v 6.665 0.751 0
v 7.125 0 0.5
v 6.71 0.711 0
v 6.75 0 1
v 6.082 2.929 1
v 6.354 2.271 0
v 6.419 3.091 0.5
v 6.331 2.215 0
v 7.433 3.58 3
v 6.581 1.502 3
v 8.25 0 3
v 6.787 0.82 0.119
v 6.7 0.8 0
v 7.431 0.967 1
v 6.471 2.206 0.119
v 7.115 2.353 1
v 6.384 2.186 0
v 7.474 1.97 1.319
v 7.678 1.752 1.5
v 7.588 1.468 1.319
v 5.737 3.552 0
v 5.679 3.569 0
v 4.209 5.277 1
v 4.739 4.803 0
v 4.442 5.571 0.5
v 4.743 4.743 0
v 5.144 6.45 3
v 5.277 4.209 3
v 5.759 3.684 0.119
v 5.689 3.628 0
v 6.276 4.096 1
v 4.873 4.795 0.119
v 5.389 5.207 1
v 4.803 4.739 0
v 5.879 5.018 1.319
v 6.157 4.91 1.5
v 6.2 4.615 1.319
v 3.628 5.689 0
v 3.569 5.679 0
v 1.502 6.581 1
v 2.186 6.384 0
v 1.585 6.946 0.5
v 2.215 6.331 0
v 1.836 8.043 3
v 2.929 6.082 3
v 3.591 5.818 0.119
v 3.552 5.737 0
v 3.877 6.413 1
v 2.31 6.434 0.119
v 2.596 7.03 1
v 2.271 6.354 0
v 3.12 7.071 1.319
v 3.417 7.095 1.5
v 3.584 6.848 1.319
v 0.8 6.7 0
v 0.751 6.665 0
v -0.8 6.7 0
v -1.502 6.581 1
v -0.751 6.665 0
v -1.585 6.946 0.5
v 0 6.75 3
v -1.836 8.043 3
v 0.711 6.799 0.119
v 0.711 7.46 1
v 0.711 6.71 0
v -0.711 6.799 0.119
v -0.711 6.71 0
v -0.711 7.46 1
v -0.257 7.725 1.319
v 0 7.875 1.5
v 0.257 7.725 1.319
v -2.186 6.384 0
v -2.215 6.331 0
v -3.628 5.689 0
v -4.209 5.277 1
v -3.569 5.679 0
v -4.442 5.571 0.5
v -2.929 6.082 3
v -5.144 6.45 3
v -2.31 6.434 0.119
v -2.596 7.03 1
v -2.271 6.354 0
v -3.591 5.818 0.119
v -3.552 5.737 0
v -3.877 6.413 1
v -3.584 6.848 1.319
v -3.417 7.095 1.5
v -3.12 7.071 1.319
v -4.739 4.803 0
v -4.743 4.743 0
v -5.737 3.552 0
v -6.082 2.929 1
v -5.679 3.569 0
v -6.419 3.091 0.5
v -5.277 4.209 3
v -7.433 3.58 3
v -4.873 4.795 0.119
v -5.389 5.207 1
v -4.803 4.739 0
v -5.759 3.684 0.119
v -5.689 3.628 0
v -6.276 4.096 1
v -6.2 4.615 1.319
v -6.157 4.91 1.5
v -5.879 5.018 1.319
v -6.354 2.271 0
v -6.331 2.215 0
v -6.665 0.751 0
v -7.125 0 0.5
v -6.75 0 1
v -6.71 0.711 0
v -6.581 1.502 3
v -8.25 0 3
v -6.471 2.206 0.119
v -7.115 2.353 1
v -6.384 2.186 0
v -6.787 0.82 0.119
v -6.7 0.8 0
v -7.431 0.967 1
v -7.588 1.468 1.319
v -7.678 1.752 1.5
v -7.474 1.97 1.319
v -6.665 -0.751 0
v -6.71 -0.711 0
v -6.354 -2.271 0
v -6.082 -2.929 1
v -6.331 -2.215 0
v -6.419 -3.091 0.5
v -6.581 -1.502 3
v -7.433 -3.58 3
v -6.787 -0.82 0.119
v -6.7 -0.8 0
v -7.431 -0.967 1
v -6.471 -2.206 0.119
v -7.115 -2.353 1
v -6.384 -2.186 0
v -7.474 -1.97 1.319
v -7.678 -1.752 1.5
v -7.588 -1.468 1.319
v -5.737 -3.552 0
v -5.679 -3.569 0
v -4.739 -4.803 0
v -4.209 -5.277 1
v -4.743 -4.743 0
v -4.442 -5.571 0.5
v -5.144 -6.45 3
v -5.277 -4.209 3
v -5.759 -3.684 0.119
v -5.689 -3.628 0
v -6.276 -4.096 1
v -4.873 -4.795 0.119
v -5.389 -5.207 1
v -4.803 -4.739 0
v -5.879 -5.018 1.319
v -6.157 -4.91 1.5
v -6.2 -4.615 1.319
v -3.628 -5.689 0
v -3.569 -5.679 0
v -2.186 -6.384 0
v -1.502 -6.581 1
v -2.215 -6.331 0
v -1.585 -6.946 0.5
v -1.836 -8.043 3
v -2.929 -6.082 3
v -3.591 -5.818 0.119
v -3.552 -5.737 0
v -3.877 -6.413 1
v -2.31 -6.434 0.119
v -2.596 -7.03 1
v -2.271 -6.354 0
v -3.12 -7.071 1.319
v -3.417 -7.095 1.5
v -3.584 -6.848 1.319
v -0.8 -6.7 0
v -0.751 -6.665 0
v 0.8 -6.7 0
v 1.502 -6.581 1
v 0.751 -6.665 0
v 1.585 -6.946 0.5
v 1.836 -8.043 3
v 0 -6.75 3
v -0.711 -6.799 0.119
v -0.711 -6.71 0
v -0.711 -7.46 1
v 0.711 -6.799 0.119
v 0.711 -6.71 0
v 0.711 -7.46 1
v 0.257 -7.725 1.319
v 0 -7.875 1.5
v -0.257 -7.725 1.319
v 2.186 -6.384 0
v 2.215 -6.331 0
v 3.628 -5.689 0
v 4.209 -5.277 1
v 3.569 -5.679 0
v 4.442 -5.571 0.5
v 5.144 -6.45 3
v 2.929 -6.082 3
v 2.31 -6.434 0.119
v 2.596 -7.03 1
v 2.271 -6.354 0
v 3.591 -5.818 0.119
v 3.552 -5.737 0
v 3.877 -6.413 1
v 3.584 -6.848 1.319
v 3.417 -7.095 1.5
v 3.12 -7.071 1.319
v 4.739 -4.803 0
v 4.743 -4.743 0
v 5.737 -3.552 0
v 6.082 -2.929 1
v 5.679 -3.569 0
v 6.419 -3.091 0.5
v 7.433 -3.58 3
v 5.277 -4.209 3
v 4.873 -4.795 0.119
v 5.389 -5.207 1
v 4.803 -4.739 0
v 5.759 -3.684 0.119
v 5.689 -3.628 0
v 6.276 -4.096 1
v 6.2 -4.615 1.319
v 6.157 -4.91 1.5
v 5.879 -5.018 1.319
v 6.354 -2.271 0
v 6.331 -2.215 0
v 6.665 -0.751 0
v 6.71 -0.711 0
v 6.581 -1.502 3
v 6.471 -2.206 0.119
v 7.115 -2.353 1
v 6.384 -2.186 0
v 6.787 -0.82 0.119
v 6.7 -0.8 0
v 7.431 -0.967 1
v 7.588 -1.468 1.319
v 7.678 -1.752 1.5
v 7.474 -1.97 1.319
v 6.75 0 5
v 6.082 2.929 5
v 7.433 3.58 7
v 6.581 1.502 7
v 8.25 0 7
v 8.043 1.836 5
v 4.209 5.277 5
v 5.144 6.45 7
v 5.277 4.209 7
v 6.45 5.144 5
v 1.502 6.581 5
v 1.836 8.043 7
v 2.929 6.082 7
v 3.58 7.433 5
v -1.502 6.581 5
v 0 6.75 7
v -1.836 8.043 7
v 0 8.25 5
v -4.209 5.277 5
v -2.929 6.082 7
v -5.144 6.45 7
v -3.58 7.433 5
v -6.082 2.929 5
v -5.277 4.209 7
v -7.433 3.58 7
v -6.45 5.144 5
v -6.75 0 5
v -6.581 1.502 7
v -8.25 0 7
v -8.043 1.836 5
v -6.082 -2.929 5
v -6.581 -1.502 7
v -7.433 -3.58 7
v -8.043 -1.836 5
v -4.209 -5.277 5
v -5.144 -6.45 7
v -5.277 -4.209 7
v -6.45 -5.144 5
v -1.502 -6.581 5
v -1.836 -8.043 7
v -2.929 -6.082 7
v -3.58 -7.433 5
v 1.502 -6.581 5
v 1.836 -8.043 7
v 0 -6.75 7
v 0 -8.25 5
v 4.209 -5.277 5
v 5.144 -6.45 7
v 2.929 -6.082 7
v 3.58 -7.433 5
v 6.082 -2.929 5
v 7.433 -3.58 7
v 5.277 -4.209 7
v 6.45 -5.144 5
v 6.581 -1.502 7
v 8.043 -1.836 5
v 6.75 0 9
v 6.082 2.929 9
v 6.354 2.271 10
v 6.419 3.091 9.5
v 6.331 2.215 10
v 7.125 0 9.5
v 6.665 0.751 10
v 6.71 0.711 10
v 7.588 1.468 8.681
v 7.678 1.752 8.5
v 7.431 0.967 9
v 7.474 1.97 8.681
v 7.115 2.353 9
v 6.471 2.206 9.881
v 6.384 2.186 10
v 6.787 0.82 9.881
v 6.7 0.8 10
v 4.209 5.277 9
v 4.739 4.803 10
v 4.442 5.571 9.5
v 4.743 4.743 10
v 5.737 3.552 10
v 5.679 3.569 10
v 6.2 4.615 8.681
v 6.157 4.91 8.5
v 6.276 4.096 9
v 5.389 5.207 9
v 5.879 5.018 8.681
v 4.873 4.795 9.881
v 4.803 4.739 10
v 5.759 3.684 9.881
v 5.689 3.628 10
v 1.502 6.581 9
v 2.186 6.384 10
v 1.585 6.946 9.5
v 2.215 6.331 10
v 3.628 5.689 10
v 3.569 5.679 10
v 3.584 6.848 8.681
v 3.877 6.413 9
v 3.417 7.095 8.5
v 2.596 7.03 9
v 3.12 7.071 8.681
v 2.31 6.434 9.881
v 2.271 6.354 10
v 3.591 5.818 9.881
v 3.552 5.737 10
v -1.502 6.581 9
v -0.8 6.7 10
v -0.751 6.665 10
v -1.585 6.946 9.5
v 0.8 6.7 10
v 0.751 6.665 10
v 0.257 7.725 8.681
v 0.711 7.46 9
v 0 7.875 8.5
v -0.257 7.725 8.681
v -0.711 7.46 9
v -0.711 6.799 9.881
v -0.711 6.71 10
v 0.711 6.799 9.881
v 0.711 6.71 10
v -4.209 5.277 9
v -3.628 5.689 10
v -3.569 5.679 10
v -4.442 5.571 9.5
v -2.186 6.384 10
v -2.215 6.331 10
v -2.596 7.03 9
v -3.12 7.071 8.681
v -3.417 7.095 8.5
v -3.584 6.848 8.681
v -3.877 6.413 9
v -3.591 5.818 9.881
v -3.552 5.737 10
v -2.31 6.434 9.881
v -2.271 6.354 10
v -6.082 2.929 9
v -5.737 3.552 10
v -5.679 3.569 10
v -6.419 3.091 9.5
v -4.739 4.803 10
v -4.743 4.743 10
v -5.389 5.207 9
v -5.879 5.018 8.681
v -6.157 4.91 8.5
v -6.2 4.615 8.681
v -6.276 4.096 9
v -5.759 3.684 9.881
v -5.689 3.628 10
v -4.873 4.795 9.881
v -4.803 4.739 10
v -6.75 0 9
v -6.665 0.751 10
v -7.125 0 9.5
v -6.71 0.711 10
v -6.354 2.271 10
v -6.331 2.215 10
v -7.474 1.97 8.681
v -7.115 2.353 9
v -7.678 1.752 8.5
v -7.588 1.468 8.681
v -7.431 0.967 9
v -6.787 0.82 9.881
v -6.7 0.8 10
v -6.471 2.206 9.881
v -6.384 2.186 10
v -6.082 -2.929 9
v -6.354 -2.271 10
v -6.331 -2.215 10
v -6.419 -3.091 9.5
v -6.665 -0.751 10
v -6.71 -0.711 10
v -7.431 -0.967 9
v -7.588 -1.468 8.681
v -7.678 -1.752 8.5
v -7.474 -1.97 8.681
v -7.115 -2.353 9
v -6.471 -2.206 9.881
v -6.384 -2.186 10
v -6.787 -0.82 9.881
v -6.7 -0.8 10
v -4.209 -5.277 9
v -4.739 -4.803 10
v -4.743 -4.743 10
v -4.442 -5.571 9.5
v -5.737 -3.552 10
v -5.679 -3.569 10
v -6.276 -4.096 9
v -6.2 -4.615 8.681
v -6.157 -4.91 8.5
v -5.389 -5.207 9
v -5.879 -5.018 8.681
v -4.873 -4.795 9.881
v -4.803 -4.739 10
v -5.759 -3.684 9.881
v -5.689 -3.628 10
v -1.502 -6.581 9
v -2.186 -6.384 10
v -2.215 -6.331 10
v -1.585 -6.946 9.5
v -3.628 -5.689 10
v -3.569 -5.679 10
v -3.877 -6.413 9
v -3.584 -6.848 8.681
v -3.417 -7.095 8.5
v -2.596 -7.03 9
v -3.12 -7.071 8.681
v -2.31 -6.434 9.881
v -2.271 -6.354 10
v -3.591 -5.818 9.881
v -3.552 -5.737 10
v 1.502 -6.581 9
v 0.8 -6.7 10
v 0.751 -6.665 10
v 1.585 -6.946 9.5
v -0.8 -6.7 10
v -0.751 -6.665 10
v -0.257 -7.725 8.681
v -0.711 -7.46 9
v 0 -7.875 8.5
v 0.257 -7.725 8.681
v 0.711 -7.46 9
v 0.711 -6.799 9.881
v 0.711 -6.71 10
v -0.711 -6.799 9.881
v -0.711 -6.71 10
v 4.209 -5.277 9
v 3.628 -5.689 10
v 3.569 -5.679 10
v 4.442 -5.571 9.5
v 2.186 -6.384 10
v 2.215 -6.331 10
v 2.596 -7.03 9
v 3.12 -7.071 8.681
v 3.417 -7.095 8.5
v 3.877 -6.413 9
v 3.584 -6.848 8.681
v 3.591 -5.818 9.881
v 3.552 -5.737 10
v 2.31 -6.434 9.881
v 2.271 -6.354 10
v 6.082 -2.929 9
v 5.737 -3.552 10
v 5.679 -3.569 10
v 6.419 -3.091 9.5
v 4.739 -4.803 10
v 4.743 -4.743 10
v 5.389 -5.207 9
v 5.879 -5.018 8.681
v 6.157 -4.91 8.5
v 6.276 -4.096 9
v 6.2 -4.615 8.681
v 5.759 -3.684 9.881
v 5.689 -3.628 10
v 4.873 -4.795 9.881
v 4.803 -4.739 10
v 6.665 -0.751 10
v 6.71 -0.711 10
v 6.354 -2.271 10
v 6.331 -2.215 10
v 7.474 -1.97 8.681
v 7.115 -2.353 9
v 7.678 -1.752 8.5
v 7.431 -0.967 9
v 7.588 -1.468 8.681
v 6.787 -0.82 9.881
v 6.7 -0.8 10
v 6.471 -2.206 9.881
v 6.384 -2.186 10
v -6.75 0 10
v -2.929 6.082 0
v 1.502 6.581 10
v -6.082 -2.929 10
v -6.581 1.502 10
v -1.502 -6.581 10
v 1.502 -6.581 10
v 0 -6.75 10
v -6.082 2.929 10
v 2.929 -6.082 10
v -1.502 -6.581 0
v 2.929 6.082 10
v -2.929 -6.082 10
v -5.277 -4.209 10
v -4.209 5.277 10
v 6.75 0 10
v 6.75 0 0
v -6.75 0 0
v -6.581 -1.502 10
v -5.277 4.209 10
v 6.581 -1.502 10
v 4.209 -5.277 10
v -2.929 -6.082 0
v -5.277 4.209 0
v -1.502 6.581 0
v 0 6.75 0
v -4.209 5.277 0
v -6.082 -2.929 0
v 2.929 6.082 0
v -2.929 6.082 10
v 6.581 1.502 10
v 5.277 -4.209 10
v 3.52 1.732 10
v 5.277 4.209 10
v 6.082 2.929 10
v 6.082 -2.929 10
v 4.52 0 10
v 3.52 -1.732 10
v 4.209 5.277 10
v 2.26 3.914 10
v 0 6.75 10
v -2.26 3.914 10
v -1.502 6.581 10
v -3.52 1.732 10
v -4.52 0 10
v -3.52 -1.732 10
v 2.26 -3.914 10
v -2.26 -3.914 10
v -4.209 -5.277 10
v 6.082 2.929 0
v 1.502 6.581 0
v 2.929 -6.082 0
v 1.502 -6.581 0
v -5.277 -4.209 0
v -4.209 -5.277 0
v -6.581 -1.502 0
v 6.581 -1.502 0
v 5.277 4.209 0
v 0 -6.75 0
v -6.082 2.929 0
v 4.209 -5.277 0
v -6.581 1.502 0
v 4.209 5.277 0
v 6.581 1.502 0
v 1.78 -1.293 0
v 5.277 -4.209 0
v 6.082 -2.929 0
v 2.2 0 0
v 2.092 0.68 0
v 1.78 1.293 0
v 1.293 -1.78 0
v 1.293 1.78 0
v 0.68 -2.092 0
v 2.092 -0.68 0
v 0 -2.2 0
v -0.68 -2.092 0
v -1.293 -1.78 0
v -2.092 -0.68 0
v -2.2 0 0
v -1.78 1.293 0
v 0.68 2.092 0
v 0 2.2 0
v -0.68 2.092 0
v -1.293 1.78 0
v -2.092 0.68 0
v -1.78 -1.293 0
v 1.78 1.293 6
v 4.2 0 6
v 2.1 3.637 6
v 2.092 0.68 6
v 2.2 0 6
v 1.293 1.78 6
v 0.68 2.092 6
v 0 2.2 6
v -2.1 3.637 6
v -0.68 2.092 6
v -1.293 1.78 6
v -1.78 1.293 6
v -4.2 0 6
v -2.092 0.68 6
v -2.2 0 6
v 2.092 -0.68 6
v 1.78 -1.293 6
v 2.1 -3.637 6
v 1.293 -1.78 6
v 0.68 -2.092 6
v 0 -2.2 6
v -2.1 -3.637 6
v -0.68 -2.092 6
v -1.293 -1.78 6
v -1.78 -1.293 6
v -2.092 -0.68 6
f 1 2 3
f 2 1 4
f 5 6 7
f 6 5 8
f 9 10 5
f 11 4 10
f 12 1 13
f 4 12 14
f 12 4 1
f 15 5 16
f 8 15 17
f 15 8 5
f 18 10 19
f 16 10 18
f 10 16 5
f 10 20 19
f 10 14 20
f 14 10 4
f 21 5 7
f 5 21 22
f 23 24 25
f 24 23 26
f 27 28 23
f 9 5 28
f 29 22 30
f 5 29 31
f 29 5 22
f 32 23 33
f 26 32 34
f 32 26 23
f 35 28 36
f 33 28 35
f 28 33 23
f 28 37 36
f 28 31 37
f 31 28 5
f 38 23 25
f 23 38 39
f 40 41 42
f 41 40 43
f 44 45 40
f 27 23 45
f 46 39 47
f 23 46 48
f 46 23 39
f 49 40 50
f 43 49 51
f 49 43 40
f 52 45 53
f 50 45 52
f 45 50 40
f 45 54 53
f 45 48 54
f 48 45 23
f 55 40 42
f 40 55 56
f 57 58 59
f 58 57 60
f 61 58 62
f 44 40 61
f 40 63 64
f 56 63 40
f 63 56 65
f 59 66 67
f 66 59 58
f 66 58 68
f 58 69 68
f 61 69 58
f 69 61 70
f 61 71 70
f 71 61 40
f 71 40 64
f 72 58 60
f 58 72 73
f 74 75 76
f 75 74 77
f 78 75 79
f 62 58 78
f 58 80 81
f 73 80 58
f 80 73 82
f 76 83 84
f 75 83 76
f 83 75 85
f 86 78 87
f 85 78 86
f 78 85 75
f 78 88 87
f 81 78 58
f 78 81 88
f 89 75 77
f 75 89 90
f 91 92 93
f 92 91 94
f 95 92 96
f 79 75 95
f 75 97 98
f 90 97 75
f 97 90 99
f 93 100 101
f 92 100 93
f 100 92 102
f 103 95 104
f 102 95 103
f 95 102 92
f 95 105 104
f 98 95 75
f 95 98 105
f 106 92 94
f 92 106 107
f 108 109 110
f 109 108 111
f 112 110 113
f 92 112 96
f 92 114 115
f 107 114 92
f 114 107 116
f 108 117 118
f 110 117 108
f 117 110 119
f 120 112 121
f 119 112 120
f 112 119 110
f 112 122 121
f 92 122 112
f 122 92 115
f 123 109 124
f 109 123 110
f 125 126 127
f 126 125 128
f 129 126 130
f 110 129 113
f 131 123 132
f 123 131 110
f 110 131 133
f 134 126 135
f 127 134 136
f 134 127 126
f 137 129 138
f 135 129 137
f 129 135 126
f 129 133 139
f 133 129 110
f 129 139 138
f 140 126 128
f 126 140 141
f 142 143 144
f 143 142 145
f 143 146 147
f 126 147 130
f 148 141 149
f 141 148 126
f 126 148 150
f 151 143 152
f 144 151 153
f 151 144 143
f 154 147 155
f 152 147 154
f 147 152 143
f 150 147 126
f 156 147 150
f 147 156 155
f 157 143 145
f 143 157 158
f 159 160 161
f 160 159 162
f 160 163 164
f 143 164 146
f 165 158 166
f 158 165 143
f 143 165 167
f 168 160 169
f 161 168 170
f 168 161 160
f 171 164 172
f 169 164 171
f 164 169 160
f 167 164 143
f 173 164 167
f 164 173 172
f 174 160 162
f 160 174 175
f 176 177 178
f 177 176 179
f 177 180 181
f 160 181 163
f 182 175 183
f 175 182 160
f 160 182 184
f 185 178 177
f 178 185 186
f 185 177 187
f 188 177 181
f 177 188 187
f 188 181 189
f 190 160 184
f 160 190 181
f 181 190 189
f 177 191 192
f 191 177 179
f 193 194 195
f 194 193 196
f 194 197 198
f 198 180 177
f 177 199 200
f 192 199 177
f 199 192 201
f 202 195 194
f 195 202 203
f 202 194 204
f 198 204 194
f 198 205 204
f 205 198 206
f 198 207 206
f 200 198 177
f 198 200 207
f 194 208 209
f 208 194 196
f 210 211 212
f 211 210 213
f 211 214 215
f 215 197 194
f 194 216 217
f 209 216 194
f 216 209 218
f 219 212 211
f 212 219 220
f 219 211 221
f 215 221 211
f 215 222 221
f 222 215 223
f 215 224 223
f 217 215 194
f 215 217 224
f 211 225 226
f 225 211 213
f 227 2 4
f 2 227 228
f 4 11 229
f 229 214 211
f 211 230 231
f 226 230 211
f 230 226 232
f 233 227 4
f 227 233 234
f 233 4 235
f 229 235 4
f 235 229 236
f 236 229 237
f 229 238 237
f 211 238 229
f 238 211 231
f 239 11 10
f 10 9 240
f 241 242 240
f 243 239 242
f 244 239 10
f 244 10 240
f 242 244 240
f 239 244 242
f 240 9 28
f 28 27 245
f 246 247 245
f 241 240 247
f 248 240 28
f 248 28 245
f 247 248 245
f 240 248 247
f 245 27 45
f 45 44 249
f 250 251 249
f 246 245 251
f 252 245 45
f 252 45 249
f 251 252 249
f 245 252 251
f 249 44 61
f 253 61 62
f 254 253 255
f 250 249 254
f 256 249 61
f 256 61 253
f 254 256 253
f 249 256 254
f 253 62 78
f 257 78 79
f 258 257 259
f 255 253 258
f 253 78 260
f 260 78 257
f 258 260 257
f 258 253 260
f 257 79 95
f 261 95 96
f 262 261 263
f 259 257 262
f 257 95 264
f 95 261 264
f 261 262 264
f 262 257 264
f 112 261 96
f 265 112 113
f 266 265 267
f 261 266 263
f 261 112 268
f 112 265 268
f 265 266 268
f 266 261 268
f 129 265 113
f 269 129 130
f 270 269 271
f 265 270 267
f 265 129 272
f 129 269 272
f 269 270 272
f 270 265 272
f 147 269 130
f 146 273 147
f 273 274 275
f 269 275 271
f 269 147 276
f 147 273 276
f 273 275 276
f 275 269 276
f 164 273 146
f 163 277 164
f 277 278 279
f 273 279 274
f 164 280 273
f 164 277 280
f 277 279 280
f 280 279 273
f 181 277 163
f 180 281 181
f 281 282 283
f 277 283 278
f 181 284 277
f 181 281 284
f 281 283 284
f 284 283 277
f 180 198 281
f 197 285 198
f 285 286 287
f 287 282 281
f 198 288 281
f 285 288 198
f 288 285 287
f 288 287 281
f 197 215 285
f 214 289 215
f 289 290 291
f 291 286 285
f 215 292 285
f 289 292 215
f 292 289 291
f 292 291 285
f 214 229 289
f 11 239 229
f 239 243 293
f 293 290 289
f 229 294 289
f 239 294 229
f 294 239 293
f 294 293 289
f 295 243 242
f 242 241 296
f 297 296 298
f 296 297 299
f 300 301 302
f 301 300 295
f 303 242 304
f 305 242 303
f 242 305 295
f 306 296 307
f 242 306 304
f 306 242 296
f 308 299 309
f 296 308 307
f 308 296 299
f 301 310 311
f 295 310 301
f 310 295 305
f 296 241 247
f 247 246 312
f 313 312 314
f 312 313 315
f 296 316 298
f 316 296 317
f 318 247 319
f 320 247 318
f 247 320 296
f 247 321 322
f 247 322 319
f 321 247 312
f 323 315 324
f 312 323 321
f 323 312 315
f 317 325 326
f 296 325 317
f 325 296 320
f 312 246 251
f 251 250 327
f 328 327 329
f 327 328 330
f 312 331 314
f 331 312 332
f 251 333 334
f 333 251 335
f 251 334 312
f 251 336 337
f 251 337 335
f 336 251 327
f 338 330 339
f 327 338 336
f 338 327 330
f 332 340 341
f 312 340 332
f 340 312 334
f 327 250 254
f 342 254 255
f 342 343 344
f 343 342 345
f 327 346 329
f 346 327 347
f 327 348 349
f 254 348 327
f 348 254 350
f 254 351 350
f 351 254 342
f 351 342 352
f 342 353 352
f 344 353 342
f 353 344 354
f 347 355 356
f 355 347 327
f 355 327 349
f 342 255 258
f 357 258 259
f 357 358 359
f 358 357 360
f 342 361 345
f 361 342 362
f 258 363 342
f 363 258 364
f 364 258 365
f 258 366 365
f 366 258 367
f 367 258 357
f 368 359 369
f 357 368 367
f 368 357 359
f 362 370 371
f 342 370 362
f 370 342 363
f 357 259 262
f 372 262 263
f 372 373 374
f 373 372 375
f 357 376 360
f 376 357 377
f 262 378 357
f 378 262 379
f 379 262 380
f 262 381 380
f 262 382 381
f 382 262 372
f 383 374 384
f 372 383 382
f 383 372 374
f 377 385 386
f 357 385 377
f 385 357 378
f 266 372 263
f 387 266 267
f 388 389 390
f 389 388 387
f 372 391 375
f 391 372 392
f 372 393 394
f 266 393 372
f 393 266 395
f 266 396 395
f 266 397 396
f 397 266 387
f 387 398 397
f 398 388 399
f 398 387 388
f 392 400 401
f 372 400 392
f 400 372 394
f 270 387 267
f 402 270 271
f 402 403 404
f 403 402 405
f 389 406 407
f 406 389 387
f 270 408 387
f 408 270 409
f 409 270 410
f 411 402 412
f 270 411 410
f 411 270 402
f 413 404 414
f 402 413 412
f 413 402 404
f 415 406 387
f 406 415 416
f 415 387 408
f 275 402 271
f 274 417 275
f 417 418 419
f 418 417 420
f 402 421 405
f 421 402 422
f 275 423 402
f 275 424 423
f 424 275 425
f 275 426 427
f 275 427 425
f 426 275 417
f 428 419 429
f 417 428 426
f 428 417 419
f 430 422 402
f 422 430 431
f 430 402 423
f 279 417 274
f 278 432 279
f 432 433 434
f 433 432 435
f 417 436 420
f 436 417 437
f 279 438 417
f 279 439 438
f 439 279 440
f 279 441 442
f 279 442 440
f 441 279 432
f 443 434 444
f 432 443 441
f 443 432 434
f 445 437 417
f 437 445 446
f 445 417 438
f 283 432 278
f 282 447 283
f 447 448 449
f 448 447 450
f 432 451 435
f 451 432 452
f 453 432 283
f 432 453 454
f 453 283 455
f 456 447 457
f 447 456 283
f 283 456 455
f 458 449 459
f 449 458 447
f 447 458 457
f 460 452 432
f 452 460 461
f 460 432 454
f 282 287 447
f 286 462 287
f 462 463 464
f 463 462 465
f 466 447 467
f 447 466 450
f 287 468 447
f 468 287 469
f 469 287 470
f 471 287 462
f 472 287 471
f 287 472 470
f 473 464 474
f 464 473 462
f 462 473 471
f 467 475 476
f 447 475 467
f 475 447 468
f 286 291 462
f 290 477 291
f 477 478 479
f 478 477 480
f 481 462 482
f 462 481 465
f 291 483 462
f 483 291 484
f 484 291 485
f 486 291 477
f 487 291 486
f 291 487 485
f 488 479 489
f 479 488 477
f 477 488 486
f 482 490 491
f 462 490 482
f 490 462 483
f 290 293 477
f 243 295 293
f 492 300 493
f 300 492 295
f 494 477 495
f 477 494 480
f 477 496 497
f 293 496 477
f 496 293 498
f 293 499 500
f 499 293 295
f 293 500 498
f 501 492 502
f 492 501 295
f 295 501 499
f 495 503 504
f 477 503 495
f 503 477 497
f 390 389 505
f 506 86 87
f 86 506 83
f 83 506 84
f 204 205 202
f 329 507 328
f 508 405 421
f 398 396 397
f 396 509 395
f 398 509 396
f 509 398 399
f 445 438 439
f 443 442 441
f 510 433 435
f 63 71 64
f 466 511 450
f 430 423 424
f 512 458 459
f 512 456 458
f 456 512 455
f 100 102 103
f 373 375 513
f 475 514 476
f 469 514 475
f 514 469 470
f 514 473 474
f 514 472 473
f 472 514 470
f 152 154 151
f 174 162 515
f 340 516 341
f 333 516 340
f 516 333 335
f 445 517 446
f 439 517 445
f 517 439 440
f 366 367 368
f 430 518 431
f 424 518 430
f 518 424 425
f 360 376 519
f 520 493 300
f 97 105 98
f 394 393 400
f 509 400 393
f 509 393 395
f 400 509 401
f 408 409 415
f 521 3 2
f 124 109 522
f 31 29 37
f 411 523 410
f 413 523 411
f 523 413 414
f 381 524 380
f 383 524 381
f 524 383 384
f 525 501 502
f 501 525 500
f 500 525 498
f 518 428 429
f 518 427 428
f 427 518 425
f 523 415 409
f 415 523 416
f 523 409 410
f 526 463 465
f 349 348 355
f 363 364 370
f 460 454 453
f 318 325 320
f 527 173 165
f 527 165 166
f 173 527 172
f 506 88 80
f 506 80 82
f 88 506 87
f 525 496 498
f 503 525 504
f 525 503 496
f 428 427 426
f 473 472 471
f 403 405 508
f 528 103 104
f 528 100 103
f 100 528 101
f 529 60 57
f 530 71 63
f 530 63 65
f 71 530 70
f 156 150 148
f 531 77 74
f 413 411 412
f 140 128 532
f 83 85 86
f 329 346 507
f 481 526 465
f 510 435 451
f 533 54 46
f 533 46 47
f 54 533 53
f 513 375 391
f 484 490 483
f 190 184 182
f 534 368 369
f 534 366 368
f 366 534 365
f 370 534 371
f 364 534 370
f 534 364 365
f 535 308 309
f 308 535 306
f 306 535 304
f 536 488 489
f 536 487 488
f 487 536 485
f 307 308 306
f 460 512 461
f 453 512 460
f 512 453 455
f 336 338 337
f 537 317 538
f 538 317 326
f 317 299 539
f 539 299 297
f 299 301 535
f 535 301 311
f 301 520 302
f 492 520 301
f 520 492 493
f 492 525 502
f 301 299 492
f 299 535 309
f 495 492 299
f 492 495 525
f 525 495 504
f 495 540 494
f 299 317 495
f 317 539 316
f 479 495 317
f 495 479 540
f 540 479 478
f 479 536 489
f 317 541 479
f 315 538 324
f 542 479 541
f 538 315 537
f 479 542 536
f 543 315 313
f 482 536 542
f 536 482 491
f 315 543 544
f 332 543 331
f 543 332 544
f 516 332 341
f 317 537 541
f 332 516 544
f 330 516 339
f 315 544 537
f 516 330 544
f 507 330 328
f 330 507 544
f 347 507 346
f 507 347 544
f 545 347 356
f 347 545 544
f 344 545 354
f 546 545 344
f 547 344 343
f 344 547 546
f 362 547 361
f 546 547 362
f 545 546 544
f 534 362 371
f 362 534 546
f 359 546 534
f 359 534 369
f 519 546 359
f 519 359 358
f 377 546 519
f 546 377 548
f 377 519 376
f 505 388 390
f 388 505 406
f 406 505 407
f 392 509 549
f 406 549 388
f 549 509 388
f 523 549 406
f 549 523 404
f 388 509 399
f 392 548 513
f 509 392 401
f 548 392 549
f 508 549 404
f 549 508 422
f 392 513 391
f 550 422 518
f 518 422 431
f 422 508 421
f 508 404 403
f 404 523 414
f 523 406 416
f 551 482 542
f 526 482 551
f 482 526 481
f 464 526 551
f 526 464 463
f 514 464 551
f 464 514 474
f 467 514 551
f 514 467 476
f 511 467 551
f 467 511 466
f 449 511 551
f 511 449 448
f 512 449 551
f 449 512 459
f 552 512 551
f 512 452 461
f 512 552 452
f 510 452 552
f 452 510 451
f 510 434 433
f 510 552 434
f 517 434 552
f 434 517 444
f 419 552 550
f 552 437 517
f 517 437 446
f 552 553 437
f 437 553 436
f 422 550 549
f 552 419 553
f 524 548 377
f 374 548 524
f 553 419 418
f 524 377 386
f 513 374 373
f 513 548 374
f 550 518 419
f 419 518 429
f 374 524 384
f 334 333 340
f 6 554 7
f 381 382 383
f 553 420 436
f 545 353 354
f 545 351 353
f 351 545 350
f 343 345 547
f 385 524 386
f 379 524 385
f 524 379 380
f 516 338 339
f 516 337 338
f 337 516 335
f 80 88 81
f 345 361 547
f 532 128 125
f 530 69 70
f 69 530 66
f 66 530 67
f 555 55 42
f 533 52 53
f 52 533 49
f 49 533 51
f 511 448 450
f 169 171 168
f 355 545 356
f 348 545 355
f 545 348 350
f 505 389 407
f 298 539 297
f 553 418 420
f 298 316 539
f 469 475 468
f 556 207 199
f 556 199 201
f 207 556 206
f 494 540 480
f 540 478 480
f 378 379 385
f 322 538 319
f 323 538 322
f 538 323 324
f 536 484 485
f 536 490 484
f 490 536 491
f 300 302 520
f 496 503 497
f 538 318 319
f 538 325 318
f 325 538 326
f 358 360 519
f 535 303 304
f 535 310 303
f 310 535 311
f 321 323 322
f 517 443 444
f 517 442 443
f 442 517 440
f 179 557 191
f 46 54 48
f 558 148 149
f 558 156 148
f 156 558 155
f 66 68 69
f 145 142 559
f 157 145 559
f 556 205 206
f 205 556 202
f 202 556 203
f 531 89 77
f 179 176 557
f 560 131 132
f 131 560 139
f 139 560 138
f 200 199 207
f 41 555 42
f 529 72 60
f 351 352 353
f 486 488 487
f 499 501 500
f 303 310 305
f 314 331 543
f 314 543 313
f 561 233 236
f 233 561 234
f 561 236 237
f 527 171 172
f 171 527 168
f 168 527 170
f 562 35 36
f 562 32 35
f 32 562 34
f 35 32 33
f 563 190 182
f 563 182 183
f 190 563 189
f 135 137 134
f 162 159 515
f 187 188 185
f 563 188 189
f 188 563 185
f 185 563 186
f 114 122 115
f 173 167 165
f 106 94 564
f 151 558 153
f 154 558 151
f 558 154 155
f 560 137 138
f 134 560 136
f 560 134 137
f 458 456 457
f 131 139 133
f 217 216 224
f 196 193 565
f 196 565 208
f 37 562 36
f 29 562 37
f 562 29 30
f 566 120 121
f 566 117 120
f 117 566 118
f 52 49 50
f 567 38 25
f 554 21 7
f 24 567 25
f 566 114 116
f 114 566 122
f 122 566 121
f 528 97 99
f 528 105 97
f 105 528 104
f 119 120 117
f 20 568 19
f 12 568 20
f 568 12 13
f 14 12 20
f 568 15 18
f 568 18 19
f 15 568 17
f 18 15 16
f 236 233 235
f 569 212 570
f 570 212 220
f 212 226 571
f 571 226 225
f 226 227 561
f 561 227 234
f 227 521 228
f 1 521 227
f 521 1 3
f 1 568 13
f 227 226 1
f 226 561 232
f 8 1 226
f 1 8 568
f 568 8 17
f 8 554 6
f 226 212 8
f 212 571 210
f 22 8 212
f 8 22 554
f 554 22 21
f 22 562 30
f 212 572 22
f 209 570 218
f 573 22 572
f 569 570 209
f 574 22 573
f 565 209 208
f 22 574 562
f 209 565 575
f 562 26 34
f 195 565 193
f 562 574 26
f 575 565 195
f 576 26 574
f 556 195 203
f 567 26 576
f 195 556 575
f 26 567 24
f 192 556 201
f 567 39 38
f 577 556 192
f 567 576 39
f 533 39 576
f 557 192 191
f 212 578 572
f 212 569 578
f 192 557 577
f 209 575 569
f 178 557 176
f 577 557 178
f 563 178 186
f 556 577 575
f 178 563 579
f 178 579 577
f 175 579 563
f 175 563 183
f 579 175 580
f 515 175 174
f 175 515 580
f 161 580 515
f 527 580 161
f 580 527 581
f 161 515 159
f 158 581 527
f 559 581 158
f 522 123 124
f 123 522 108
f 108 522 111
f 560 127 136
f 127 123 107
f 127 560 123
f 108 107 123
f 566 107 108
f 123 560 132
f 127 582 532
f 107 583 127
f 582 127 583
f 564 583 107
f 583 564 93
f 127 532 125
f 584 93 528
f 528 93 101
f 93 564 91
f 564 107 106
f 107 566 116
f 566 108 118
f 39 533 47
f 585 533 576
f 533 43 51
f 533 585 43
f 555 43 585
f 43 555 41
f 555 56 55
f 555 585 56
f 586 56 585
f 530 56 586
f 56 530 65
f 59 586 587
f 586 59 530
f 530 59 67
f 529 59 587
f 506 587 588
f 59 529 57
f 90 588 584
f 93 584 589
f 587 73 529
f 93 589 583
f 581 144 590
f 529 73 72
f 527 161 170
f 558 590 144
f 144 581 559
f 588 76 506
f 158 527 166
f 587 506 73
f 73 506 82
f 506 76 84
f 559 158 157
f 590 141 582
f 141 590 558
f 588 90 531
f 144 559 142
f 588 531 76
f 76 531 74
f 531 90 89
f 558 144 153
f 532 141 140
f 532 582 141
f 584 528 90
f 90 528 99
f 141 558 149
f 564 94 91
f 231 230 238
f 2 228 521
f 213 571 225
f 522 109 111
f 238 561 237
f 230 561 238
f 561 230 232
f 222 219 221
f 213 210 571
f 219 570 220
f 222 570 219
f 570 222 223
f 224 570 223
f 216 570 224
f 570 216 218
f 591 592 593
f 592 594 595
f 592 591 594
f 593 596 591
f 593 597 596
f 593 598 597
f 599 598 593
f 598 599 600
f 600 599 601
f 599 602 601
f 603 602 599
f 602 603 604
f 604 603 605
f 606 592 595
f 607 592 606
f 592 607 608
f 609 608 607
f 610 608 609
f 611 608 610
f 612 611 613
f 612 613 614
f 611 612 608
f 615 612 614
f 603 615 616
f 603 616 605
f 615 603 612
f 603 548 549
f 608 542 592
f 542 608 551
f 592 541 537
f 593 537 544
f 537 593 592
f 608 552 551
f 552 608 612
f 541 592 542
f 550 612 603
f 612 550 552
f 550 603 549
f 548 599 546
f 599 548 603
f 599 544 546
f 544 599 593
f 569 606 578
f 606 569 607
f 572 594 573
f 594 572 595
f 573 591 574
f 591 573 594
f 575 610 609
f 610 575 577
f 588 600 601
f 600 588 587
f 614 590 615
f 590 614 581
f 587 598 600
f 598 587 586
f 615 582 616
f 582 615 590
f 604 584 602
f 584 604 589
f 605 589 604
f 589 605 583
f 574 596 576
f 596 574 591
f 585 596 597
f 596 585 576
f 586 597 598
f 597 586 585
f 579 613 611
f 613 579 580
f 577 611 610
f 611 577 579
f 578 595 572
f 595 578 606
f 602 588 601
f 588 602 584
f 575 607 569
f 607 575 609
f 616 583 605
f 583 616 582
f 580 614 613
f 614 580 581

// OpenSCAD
/*
 * knurledFinishLib_v2.scad
 * 
 * Written by aubenc @ Thingiverse
 *
 * This script is licensed under the Public Domain license.
 *
 * http://www.thingiverse.com/thing:31122
 *
 * Derived from knurledFinishLib.scad (also Public Domain license) available at
 *
 * http://www.thingiverse.com/thing:9095
 *
 * Usage:
 *
 *	 Drop this script somewhere where OpenSCAD can find it (your current project's
 *	 working directory/folder or your OpenSCAD libraries directory/folder).
 *
 *	 Add the line:
 *
 *		use <knurledFinishLib_v2.scad>
 *
 *	 in your OpenSCAD script and call either...
 *
 *    knurled_cyl( Knurled cylinder height,
 *                 Knurled cylinder outer diameter,
 *                 Knurl polyhedron width,
 *                 Knurl polyhedron height,
 *                 Knurl polyhedron depth,
 *                 Cylinder ends smoothed height,
 *                 Knurled surface smoothing amount );
 *
 *  ...or...
 *
 *    knurl();
 *
 *	If you use knurled_cyl() module, you need to specify the values for all and
 *
 *  Call the module ' help(); ' for a little bit more of detail
 *  and/or take a look to the PDF available at http://www.thingiverse.com/thing:9095
 *  for a in depth descrition of the knurl properties.
 */


module knurl(	k_cyl_hg	= 12,
					k_cyl_od	= 25,
					knurl_wd =  3,
					knurl_hg =  4,
					knurl_dp =  1.5,
					e_smooth =  2,
					s_smooth =  0)
{
    knurled_cyl(k_cyl_hg, k_cyl_od, 
                knurl_wd, knurl_hg, knurl_dp, 
                e_smooth, s_smooth);
}

module knurled_cyl(chg, cod, cwd, csh, cdp, fsh, smt)
{
    cord=(cod+cdp+cdp*smt/100)/2;
    cird=cord-cdp;
    cfn=round(2*cird*PI/cwd);
    clf=360/cfn;
    crn=ceil(chg/csh);

    echo("knurled cylinder max diameter: ", 2*cord);
    echo("knurled cylinder min diameter: ", 2*cird);

	 if( fsh < 0 )
    {
        union()
        {
            shape(fsh, cird+cdp*smt/100, cord, cfn*4, chg);

            translate([0,0,-(crn*csh-chg)/2])
              knurled_finish(cord, cird, clf, csh, cfn, crn);
        }
    }
    else if ( fsh == 0 )
    {
        intersection()
        {
            cylinder(h=chg, r=cord-cdp*smt/100, $fn=2*cfn, center=false);

            translate([0,0,-(crn*csh-chg)/2])
              knurled_finish(cord, cird, clf, csh, cfn, crn);
        }
    }
    else
    {
        intersection()
        {
            shape(fsh, cird, cord-cdp*smt/100, cfn*4, chg);

            translate([0,0,-(crn*csh-chg)/2])
              knurled_finish(cord, cird, clf, csh, cfn, crn);
        }
    }
}

module shape(hsh, ird, ord, fn4, hg)
{
	x0= 0;	x1 = hsh > 0 ? ird : ord;		x2 = hsh > 0 ? ord : ird;
	y0=-0.1;	y1=0;	y2=abs(hsh);	y3=hg-abs(hsh);	y4=hg;	y5=hg+0.1;

	if ( hsh >= 0 )
	{
		rotate_extrude(convexity=10, $fn=fn4)
		polygon(points=[	[x0,y1],[x1,y1],[x2,y2],[x2,y3],[x1,y4],[x0,y4]	],
					paths=[	[0,1,2,3,4,5]	]);
	}
	else
	{
		rotate_extrude(convexity=10, $fn=fn4)
		polygon(points=[	[x0,y0],[x1,y0],[x1,y1],[x2,y2],
								[x2,y3],[x1,y4],[x1,y5],[x0,y5]	],
					paths=[	[0,1,2,3,4,5,6,7]	]);
	}
}

module knurled_finish(ord, ird, lf, sh, fn, rn)
{
    for(j=[0:rn-1])
    assign(h0=sh*j, h1=sh*(j+1/2), h2=sh*(j+1))
    {
        for(i=[0:fn-1])
        assign(lf0=lf*i, lf1=lf*(i+1/2), lf2=lf*(i+1))
        {
            polyhedron(
                points=[
                     [ 0,0,h0],
                     [ ord*cos(lf0), ord*sin(lf0), h0],
                     [ ird*cos(lf1), ird*sin(lf1), h0],
                     [ ord*cos(lf2), ord*sin(lf2), h0],

                     [ ird*cos(lf0), ird*sin(lf0), h1],
                     [ ord*cos(lf1), ord*sin(lf1), h1],
                     [ ird*cos(lf2), ird*sin(lf2), h1],

                     [ 0,0,h2],
                     [ ord*cos(lf0), ord*sin(lf0), h2],
                     [ ird*cos(lf1), ird*sin(lf1), h2],
                     [ ord*cos(lf2), ord*sin(lf2), h2]
                    ],
                triangles=[
                     [0,1,2],[2,3,0],
                     [1,0,4],[4,0,7],[7,8,4],
                     [8,7,9],[10,9,7],
                     [10,7,6],[6,7,0],[3,6,0],
                     [2,1,4],[3,2,6],[10,6,9],[8,9,4],
                     [4,5,2],[2,5,6],[6,5,9],[9,5,4]
                    ],
                convexity=5);
         }
    }
}

module knurl_help()
{
	echo();
	echo("    Knurled Surface Library  v2  ");
   echo("");
	echo("      Modules:    ");
	echo("");
	echo("        knurled_cyl(parameters... );    -    Requires a value for each an every expected parameter (see bellow)    ");
	echo("");
	echo("        knurl();    -    Call to the previous module with a set of default parameters,    ");
	echo("                                  values may be changed by adding 'parameter_name=value'        i.e.     knurl(s_smooth=40);    ");
	echo("");
	echo("      Parameters, all of them in mm but the last one.    ");
	echo("");
	echo("        k_cyl_hg       -   [ 12   ]  ,,  Height for the knurled cylinder    ");
	echo("        k_cyl_od      -   [ 25   ]  ,,  Cylinder's Outer Diameter before applying the knurled surfacefinishing.    ");
	echo("        knurl_wd     -   [   3   ]  ,,  Knurl's Width.    ");
	echo("        knurl_hg      -   [   4   ]  ,,  Knurl's Height.    ");
	echo("        knurl_dp     -   [  1.5 ]  ,,  Knurl's Depth.    ");
	echo("        e_smooth   -    [  2   ]  ,,  Bevel's Height at the bottom and the top of the cylinder    ");
	echo("        s_smooth   -    [  0   ]  ,,  Knurl's Surface Smoothing :  File donwn the top of the knurl this value, i.e. 40 will snooth it a 40%.    ");
	echo("");
}



difference() {
	knurl(k_cyl_hg	= 10,	k_cyl_od	= 15);
	translate([0,0,6])
		cylinder(h = 10, r1 = 4.2, r2=5, $fn=6);
	cylinder(h = 10, r = 2.2, $fn=20);
};
